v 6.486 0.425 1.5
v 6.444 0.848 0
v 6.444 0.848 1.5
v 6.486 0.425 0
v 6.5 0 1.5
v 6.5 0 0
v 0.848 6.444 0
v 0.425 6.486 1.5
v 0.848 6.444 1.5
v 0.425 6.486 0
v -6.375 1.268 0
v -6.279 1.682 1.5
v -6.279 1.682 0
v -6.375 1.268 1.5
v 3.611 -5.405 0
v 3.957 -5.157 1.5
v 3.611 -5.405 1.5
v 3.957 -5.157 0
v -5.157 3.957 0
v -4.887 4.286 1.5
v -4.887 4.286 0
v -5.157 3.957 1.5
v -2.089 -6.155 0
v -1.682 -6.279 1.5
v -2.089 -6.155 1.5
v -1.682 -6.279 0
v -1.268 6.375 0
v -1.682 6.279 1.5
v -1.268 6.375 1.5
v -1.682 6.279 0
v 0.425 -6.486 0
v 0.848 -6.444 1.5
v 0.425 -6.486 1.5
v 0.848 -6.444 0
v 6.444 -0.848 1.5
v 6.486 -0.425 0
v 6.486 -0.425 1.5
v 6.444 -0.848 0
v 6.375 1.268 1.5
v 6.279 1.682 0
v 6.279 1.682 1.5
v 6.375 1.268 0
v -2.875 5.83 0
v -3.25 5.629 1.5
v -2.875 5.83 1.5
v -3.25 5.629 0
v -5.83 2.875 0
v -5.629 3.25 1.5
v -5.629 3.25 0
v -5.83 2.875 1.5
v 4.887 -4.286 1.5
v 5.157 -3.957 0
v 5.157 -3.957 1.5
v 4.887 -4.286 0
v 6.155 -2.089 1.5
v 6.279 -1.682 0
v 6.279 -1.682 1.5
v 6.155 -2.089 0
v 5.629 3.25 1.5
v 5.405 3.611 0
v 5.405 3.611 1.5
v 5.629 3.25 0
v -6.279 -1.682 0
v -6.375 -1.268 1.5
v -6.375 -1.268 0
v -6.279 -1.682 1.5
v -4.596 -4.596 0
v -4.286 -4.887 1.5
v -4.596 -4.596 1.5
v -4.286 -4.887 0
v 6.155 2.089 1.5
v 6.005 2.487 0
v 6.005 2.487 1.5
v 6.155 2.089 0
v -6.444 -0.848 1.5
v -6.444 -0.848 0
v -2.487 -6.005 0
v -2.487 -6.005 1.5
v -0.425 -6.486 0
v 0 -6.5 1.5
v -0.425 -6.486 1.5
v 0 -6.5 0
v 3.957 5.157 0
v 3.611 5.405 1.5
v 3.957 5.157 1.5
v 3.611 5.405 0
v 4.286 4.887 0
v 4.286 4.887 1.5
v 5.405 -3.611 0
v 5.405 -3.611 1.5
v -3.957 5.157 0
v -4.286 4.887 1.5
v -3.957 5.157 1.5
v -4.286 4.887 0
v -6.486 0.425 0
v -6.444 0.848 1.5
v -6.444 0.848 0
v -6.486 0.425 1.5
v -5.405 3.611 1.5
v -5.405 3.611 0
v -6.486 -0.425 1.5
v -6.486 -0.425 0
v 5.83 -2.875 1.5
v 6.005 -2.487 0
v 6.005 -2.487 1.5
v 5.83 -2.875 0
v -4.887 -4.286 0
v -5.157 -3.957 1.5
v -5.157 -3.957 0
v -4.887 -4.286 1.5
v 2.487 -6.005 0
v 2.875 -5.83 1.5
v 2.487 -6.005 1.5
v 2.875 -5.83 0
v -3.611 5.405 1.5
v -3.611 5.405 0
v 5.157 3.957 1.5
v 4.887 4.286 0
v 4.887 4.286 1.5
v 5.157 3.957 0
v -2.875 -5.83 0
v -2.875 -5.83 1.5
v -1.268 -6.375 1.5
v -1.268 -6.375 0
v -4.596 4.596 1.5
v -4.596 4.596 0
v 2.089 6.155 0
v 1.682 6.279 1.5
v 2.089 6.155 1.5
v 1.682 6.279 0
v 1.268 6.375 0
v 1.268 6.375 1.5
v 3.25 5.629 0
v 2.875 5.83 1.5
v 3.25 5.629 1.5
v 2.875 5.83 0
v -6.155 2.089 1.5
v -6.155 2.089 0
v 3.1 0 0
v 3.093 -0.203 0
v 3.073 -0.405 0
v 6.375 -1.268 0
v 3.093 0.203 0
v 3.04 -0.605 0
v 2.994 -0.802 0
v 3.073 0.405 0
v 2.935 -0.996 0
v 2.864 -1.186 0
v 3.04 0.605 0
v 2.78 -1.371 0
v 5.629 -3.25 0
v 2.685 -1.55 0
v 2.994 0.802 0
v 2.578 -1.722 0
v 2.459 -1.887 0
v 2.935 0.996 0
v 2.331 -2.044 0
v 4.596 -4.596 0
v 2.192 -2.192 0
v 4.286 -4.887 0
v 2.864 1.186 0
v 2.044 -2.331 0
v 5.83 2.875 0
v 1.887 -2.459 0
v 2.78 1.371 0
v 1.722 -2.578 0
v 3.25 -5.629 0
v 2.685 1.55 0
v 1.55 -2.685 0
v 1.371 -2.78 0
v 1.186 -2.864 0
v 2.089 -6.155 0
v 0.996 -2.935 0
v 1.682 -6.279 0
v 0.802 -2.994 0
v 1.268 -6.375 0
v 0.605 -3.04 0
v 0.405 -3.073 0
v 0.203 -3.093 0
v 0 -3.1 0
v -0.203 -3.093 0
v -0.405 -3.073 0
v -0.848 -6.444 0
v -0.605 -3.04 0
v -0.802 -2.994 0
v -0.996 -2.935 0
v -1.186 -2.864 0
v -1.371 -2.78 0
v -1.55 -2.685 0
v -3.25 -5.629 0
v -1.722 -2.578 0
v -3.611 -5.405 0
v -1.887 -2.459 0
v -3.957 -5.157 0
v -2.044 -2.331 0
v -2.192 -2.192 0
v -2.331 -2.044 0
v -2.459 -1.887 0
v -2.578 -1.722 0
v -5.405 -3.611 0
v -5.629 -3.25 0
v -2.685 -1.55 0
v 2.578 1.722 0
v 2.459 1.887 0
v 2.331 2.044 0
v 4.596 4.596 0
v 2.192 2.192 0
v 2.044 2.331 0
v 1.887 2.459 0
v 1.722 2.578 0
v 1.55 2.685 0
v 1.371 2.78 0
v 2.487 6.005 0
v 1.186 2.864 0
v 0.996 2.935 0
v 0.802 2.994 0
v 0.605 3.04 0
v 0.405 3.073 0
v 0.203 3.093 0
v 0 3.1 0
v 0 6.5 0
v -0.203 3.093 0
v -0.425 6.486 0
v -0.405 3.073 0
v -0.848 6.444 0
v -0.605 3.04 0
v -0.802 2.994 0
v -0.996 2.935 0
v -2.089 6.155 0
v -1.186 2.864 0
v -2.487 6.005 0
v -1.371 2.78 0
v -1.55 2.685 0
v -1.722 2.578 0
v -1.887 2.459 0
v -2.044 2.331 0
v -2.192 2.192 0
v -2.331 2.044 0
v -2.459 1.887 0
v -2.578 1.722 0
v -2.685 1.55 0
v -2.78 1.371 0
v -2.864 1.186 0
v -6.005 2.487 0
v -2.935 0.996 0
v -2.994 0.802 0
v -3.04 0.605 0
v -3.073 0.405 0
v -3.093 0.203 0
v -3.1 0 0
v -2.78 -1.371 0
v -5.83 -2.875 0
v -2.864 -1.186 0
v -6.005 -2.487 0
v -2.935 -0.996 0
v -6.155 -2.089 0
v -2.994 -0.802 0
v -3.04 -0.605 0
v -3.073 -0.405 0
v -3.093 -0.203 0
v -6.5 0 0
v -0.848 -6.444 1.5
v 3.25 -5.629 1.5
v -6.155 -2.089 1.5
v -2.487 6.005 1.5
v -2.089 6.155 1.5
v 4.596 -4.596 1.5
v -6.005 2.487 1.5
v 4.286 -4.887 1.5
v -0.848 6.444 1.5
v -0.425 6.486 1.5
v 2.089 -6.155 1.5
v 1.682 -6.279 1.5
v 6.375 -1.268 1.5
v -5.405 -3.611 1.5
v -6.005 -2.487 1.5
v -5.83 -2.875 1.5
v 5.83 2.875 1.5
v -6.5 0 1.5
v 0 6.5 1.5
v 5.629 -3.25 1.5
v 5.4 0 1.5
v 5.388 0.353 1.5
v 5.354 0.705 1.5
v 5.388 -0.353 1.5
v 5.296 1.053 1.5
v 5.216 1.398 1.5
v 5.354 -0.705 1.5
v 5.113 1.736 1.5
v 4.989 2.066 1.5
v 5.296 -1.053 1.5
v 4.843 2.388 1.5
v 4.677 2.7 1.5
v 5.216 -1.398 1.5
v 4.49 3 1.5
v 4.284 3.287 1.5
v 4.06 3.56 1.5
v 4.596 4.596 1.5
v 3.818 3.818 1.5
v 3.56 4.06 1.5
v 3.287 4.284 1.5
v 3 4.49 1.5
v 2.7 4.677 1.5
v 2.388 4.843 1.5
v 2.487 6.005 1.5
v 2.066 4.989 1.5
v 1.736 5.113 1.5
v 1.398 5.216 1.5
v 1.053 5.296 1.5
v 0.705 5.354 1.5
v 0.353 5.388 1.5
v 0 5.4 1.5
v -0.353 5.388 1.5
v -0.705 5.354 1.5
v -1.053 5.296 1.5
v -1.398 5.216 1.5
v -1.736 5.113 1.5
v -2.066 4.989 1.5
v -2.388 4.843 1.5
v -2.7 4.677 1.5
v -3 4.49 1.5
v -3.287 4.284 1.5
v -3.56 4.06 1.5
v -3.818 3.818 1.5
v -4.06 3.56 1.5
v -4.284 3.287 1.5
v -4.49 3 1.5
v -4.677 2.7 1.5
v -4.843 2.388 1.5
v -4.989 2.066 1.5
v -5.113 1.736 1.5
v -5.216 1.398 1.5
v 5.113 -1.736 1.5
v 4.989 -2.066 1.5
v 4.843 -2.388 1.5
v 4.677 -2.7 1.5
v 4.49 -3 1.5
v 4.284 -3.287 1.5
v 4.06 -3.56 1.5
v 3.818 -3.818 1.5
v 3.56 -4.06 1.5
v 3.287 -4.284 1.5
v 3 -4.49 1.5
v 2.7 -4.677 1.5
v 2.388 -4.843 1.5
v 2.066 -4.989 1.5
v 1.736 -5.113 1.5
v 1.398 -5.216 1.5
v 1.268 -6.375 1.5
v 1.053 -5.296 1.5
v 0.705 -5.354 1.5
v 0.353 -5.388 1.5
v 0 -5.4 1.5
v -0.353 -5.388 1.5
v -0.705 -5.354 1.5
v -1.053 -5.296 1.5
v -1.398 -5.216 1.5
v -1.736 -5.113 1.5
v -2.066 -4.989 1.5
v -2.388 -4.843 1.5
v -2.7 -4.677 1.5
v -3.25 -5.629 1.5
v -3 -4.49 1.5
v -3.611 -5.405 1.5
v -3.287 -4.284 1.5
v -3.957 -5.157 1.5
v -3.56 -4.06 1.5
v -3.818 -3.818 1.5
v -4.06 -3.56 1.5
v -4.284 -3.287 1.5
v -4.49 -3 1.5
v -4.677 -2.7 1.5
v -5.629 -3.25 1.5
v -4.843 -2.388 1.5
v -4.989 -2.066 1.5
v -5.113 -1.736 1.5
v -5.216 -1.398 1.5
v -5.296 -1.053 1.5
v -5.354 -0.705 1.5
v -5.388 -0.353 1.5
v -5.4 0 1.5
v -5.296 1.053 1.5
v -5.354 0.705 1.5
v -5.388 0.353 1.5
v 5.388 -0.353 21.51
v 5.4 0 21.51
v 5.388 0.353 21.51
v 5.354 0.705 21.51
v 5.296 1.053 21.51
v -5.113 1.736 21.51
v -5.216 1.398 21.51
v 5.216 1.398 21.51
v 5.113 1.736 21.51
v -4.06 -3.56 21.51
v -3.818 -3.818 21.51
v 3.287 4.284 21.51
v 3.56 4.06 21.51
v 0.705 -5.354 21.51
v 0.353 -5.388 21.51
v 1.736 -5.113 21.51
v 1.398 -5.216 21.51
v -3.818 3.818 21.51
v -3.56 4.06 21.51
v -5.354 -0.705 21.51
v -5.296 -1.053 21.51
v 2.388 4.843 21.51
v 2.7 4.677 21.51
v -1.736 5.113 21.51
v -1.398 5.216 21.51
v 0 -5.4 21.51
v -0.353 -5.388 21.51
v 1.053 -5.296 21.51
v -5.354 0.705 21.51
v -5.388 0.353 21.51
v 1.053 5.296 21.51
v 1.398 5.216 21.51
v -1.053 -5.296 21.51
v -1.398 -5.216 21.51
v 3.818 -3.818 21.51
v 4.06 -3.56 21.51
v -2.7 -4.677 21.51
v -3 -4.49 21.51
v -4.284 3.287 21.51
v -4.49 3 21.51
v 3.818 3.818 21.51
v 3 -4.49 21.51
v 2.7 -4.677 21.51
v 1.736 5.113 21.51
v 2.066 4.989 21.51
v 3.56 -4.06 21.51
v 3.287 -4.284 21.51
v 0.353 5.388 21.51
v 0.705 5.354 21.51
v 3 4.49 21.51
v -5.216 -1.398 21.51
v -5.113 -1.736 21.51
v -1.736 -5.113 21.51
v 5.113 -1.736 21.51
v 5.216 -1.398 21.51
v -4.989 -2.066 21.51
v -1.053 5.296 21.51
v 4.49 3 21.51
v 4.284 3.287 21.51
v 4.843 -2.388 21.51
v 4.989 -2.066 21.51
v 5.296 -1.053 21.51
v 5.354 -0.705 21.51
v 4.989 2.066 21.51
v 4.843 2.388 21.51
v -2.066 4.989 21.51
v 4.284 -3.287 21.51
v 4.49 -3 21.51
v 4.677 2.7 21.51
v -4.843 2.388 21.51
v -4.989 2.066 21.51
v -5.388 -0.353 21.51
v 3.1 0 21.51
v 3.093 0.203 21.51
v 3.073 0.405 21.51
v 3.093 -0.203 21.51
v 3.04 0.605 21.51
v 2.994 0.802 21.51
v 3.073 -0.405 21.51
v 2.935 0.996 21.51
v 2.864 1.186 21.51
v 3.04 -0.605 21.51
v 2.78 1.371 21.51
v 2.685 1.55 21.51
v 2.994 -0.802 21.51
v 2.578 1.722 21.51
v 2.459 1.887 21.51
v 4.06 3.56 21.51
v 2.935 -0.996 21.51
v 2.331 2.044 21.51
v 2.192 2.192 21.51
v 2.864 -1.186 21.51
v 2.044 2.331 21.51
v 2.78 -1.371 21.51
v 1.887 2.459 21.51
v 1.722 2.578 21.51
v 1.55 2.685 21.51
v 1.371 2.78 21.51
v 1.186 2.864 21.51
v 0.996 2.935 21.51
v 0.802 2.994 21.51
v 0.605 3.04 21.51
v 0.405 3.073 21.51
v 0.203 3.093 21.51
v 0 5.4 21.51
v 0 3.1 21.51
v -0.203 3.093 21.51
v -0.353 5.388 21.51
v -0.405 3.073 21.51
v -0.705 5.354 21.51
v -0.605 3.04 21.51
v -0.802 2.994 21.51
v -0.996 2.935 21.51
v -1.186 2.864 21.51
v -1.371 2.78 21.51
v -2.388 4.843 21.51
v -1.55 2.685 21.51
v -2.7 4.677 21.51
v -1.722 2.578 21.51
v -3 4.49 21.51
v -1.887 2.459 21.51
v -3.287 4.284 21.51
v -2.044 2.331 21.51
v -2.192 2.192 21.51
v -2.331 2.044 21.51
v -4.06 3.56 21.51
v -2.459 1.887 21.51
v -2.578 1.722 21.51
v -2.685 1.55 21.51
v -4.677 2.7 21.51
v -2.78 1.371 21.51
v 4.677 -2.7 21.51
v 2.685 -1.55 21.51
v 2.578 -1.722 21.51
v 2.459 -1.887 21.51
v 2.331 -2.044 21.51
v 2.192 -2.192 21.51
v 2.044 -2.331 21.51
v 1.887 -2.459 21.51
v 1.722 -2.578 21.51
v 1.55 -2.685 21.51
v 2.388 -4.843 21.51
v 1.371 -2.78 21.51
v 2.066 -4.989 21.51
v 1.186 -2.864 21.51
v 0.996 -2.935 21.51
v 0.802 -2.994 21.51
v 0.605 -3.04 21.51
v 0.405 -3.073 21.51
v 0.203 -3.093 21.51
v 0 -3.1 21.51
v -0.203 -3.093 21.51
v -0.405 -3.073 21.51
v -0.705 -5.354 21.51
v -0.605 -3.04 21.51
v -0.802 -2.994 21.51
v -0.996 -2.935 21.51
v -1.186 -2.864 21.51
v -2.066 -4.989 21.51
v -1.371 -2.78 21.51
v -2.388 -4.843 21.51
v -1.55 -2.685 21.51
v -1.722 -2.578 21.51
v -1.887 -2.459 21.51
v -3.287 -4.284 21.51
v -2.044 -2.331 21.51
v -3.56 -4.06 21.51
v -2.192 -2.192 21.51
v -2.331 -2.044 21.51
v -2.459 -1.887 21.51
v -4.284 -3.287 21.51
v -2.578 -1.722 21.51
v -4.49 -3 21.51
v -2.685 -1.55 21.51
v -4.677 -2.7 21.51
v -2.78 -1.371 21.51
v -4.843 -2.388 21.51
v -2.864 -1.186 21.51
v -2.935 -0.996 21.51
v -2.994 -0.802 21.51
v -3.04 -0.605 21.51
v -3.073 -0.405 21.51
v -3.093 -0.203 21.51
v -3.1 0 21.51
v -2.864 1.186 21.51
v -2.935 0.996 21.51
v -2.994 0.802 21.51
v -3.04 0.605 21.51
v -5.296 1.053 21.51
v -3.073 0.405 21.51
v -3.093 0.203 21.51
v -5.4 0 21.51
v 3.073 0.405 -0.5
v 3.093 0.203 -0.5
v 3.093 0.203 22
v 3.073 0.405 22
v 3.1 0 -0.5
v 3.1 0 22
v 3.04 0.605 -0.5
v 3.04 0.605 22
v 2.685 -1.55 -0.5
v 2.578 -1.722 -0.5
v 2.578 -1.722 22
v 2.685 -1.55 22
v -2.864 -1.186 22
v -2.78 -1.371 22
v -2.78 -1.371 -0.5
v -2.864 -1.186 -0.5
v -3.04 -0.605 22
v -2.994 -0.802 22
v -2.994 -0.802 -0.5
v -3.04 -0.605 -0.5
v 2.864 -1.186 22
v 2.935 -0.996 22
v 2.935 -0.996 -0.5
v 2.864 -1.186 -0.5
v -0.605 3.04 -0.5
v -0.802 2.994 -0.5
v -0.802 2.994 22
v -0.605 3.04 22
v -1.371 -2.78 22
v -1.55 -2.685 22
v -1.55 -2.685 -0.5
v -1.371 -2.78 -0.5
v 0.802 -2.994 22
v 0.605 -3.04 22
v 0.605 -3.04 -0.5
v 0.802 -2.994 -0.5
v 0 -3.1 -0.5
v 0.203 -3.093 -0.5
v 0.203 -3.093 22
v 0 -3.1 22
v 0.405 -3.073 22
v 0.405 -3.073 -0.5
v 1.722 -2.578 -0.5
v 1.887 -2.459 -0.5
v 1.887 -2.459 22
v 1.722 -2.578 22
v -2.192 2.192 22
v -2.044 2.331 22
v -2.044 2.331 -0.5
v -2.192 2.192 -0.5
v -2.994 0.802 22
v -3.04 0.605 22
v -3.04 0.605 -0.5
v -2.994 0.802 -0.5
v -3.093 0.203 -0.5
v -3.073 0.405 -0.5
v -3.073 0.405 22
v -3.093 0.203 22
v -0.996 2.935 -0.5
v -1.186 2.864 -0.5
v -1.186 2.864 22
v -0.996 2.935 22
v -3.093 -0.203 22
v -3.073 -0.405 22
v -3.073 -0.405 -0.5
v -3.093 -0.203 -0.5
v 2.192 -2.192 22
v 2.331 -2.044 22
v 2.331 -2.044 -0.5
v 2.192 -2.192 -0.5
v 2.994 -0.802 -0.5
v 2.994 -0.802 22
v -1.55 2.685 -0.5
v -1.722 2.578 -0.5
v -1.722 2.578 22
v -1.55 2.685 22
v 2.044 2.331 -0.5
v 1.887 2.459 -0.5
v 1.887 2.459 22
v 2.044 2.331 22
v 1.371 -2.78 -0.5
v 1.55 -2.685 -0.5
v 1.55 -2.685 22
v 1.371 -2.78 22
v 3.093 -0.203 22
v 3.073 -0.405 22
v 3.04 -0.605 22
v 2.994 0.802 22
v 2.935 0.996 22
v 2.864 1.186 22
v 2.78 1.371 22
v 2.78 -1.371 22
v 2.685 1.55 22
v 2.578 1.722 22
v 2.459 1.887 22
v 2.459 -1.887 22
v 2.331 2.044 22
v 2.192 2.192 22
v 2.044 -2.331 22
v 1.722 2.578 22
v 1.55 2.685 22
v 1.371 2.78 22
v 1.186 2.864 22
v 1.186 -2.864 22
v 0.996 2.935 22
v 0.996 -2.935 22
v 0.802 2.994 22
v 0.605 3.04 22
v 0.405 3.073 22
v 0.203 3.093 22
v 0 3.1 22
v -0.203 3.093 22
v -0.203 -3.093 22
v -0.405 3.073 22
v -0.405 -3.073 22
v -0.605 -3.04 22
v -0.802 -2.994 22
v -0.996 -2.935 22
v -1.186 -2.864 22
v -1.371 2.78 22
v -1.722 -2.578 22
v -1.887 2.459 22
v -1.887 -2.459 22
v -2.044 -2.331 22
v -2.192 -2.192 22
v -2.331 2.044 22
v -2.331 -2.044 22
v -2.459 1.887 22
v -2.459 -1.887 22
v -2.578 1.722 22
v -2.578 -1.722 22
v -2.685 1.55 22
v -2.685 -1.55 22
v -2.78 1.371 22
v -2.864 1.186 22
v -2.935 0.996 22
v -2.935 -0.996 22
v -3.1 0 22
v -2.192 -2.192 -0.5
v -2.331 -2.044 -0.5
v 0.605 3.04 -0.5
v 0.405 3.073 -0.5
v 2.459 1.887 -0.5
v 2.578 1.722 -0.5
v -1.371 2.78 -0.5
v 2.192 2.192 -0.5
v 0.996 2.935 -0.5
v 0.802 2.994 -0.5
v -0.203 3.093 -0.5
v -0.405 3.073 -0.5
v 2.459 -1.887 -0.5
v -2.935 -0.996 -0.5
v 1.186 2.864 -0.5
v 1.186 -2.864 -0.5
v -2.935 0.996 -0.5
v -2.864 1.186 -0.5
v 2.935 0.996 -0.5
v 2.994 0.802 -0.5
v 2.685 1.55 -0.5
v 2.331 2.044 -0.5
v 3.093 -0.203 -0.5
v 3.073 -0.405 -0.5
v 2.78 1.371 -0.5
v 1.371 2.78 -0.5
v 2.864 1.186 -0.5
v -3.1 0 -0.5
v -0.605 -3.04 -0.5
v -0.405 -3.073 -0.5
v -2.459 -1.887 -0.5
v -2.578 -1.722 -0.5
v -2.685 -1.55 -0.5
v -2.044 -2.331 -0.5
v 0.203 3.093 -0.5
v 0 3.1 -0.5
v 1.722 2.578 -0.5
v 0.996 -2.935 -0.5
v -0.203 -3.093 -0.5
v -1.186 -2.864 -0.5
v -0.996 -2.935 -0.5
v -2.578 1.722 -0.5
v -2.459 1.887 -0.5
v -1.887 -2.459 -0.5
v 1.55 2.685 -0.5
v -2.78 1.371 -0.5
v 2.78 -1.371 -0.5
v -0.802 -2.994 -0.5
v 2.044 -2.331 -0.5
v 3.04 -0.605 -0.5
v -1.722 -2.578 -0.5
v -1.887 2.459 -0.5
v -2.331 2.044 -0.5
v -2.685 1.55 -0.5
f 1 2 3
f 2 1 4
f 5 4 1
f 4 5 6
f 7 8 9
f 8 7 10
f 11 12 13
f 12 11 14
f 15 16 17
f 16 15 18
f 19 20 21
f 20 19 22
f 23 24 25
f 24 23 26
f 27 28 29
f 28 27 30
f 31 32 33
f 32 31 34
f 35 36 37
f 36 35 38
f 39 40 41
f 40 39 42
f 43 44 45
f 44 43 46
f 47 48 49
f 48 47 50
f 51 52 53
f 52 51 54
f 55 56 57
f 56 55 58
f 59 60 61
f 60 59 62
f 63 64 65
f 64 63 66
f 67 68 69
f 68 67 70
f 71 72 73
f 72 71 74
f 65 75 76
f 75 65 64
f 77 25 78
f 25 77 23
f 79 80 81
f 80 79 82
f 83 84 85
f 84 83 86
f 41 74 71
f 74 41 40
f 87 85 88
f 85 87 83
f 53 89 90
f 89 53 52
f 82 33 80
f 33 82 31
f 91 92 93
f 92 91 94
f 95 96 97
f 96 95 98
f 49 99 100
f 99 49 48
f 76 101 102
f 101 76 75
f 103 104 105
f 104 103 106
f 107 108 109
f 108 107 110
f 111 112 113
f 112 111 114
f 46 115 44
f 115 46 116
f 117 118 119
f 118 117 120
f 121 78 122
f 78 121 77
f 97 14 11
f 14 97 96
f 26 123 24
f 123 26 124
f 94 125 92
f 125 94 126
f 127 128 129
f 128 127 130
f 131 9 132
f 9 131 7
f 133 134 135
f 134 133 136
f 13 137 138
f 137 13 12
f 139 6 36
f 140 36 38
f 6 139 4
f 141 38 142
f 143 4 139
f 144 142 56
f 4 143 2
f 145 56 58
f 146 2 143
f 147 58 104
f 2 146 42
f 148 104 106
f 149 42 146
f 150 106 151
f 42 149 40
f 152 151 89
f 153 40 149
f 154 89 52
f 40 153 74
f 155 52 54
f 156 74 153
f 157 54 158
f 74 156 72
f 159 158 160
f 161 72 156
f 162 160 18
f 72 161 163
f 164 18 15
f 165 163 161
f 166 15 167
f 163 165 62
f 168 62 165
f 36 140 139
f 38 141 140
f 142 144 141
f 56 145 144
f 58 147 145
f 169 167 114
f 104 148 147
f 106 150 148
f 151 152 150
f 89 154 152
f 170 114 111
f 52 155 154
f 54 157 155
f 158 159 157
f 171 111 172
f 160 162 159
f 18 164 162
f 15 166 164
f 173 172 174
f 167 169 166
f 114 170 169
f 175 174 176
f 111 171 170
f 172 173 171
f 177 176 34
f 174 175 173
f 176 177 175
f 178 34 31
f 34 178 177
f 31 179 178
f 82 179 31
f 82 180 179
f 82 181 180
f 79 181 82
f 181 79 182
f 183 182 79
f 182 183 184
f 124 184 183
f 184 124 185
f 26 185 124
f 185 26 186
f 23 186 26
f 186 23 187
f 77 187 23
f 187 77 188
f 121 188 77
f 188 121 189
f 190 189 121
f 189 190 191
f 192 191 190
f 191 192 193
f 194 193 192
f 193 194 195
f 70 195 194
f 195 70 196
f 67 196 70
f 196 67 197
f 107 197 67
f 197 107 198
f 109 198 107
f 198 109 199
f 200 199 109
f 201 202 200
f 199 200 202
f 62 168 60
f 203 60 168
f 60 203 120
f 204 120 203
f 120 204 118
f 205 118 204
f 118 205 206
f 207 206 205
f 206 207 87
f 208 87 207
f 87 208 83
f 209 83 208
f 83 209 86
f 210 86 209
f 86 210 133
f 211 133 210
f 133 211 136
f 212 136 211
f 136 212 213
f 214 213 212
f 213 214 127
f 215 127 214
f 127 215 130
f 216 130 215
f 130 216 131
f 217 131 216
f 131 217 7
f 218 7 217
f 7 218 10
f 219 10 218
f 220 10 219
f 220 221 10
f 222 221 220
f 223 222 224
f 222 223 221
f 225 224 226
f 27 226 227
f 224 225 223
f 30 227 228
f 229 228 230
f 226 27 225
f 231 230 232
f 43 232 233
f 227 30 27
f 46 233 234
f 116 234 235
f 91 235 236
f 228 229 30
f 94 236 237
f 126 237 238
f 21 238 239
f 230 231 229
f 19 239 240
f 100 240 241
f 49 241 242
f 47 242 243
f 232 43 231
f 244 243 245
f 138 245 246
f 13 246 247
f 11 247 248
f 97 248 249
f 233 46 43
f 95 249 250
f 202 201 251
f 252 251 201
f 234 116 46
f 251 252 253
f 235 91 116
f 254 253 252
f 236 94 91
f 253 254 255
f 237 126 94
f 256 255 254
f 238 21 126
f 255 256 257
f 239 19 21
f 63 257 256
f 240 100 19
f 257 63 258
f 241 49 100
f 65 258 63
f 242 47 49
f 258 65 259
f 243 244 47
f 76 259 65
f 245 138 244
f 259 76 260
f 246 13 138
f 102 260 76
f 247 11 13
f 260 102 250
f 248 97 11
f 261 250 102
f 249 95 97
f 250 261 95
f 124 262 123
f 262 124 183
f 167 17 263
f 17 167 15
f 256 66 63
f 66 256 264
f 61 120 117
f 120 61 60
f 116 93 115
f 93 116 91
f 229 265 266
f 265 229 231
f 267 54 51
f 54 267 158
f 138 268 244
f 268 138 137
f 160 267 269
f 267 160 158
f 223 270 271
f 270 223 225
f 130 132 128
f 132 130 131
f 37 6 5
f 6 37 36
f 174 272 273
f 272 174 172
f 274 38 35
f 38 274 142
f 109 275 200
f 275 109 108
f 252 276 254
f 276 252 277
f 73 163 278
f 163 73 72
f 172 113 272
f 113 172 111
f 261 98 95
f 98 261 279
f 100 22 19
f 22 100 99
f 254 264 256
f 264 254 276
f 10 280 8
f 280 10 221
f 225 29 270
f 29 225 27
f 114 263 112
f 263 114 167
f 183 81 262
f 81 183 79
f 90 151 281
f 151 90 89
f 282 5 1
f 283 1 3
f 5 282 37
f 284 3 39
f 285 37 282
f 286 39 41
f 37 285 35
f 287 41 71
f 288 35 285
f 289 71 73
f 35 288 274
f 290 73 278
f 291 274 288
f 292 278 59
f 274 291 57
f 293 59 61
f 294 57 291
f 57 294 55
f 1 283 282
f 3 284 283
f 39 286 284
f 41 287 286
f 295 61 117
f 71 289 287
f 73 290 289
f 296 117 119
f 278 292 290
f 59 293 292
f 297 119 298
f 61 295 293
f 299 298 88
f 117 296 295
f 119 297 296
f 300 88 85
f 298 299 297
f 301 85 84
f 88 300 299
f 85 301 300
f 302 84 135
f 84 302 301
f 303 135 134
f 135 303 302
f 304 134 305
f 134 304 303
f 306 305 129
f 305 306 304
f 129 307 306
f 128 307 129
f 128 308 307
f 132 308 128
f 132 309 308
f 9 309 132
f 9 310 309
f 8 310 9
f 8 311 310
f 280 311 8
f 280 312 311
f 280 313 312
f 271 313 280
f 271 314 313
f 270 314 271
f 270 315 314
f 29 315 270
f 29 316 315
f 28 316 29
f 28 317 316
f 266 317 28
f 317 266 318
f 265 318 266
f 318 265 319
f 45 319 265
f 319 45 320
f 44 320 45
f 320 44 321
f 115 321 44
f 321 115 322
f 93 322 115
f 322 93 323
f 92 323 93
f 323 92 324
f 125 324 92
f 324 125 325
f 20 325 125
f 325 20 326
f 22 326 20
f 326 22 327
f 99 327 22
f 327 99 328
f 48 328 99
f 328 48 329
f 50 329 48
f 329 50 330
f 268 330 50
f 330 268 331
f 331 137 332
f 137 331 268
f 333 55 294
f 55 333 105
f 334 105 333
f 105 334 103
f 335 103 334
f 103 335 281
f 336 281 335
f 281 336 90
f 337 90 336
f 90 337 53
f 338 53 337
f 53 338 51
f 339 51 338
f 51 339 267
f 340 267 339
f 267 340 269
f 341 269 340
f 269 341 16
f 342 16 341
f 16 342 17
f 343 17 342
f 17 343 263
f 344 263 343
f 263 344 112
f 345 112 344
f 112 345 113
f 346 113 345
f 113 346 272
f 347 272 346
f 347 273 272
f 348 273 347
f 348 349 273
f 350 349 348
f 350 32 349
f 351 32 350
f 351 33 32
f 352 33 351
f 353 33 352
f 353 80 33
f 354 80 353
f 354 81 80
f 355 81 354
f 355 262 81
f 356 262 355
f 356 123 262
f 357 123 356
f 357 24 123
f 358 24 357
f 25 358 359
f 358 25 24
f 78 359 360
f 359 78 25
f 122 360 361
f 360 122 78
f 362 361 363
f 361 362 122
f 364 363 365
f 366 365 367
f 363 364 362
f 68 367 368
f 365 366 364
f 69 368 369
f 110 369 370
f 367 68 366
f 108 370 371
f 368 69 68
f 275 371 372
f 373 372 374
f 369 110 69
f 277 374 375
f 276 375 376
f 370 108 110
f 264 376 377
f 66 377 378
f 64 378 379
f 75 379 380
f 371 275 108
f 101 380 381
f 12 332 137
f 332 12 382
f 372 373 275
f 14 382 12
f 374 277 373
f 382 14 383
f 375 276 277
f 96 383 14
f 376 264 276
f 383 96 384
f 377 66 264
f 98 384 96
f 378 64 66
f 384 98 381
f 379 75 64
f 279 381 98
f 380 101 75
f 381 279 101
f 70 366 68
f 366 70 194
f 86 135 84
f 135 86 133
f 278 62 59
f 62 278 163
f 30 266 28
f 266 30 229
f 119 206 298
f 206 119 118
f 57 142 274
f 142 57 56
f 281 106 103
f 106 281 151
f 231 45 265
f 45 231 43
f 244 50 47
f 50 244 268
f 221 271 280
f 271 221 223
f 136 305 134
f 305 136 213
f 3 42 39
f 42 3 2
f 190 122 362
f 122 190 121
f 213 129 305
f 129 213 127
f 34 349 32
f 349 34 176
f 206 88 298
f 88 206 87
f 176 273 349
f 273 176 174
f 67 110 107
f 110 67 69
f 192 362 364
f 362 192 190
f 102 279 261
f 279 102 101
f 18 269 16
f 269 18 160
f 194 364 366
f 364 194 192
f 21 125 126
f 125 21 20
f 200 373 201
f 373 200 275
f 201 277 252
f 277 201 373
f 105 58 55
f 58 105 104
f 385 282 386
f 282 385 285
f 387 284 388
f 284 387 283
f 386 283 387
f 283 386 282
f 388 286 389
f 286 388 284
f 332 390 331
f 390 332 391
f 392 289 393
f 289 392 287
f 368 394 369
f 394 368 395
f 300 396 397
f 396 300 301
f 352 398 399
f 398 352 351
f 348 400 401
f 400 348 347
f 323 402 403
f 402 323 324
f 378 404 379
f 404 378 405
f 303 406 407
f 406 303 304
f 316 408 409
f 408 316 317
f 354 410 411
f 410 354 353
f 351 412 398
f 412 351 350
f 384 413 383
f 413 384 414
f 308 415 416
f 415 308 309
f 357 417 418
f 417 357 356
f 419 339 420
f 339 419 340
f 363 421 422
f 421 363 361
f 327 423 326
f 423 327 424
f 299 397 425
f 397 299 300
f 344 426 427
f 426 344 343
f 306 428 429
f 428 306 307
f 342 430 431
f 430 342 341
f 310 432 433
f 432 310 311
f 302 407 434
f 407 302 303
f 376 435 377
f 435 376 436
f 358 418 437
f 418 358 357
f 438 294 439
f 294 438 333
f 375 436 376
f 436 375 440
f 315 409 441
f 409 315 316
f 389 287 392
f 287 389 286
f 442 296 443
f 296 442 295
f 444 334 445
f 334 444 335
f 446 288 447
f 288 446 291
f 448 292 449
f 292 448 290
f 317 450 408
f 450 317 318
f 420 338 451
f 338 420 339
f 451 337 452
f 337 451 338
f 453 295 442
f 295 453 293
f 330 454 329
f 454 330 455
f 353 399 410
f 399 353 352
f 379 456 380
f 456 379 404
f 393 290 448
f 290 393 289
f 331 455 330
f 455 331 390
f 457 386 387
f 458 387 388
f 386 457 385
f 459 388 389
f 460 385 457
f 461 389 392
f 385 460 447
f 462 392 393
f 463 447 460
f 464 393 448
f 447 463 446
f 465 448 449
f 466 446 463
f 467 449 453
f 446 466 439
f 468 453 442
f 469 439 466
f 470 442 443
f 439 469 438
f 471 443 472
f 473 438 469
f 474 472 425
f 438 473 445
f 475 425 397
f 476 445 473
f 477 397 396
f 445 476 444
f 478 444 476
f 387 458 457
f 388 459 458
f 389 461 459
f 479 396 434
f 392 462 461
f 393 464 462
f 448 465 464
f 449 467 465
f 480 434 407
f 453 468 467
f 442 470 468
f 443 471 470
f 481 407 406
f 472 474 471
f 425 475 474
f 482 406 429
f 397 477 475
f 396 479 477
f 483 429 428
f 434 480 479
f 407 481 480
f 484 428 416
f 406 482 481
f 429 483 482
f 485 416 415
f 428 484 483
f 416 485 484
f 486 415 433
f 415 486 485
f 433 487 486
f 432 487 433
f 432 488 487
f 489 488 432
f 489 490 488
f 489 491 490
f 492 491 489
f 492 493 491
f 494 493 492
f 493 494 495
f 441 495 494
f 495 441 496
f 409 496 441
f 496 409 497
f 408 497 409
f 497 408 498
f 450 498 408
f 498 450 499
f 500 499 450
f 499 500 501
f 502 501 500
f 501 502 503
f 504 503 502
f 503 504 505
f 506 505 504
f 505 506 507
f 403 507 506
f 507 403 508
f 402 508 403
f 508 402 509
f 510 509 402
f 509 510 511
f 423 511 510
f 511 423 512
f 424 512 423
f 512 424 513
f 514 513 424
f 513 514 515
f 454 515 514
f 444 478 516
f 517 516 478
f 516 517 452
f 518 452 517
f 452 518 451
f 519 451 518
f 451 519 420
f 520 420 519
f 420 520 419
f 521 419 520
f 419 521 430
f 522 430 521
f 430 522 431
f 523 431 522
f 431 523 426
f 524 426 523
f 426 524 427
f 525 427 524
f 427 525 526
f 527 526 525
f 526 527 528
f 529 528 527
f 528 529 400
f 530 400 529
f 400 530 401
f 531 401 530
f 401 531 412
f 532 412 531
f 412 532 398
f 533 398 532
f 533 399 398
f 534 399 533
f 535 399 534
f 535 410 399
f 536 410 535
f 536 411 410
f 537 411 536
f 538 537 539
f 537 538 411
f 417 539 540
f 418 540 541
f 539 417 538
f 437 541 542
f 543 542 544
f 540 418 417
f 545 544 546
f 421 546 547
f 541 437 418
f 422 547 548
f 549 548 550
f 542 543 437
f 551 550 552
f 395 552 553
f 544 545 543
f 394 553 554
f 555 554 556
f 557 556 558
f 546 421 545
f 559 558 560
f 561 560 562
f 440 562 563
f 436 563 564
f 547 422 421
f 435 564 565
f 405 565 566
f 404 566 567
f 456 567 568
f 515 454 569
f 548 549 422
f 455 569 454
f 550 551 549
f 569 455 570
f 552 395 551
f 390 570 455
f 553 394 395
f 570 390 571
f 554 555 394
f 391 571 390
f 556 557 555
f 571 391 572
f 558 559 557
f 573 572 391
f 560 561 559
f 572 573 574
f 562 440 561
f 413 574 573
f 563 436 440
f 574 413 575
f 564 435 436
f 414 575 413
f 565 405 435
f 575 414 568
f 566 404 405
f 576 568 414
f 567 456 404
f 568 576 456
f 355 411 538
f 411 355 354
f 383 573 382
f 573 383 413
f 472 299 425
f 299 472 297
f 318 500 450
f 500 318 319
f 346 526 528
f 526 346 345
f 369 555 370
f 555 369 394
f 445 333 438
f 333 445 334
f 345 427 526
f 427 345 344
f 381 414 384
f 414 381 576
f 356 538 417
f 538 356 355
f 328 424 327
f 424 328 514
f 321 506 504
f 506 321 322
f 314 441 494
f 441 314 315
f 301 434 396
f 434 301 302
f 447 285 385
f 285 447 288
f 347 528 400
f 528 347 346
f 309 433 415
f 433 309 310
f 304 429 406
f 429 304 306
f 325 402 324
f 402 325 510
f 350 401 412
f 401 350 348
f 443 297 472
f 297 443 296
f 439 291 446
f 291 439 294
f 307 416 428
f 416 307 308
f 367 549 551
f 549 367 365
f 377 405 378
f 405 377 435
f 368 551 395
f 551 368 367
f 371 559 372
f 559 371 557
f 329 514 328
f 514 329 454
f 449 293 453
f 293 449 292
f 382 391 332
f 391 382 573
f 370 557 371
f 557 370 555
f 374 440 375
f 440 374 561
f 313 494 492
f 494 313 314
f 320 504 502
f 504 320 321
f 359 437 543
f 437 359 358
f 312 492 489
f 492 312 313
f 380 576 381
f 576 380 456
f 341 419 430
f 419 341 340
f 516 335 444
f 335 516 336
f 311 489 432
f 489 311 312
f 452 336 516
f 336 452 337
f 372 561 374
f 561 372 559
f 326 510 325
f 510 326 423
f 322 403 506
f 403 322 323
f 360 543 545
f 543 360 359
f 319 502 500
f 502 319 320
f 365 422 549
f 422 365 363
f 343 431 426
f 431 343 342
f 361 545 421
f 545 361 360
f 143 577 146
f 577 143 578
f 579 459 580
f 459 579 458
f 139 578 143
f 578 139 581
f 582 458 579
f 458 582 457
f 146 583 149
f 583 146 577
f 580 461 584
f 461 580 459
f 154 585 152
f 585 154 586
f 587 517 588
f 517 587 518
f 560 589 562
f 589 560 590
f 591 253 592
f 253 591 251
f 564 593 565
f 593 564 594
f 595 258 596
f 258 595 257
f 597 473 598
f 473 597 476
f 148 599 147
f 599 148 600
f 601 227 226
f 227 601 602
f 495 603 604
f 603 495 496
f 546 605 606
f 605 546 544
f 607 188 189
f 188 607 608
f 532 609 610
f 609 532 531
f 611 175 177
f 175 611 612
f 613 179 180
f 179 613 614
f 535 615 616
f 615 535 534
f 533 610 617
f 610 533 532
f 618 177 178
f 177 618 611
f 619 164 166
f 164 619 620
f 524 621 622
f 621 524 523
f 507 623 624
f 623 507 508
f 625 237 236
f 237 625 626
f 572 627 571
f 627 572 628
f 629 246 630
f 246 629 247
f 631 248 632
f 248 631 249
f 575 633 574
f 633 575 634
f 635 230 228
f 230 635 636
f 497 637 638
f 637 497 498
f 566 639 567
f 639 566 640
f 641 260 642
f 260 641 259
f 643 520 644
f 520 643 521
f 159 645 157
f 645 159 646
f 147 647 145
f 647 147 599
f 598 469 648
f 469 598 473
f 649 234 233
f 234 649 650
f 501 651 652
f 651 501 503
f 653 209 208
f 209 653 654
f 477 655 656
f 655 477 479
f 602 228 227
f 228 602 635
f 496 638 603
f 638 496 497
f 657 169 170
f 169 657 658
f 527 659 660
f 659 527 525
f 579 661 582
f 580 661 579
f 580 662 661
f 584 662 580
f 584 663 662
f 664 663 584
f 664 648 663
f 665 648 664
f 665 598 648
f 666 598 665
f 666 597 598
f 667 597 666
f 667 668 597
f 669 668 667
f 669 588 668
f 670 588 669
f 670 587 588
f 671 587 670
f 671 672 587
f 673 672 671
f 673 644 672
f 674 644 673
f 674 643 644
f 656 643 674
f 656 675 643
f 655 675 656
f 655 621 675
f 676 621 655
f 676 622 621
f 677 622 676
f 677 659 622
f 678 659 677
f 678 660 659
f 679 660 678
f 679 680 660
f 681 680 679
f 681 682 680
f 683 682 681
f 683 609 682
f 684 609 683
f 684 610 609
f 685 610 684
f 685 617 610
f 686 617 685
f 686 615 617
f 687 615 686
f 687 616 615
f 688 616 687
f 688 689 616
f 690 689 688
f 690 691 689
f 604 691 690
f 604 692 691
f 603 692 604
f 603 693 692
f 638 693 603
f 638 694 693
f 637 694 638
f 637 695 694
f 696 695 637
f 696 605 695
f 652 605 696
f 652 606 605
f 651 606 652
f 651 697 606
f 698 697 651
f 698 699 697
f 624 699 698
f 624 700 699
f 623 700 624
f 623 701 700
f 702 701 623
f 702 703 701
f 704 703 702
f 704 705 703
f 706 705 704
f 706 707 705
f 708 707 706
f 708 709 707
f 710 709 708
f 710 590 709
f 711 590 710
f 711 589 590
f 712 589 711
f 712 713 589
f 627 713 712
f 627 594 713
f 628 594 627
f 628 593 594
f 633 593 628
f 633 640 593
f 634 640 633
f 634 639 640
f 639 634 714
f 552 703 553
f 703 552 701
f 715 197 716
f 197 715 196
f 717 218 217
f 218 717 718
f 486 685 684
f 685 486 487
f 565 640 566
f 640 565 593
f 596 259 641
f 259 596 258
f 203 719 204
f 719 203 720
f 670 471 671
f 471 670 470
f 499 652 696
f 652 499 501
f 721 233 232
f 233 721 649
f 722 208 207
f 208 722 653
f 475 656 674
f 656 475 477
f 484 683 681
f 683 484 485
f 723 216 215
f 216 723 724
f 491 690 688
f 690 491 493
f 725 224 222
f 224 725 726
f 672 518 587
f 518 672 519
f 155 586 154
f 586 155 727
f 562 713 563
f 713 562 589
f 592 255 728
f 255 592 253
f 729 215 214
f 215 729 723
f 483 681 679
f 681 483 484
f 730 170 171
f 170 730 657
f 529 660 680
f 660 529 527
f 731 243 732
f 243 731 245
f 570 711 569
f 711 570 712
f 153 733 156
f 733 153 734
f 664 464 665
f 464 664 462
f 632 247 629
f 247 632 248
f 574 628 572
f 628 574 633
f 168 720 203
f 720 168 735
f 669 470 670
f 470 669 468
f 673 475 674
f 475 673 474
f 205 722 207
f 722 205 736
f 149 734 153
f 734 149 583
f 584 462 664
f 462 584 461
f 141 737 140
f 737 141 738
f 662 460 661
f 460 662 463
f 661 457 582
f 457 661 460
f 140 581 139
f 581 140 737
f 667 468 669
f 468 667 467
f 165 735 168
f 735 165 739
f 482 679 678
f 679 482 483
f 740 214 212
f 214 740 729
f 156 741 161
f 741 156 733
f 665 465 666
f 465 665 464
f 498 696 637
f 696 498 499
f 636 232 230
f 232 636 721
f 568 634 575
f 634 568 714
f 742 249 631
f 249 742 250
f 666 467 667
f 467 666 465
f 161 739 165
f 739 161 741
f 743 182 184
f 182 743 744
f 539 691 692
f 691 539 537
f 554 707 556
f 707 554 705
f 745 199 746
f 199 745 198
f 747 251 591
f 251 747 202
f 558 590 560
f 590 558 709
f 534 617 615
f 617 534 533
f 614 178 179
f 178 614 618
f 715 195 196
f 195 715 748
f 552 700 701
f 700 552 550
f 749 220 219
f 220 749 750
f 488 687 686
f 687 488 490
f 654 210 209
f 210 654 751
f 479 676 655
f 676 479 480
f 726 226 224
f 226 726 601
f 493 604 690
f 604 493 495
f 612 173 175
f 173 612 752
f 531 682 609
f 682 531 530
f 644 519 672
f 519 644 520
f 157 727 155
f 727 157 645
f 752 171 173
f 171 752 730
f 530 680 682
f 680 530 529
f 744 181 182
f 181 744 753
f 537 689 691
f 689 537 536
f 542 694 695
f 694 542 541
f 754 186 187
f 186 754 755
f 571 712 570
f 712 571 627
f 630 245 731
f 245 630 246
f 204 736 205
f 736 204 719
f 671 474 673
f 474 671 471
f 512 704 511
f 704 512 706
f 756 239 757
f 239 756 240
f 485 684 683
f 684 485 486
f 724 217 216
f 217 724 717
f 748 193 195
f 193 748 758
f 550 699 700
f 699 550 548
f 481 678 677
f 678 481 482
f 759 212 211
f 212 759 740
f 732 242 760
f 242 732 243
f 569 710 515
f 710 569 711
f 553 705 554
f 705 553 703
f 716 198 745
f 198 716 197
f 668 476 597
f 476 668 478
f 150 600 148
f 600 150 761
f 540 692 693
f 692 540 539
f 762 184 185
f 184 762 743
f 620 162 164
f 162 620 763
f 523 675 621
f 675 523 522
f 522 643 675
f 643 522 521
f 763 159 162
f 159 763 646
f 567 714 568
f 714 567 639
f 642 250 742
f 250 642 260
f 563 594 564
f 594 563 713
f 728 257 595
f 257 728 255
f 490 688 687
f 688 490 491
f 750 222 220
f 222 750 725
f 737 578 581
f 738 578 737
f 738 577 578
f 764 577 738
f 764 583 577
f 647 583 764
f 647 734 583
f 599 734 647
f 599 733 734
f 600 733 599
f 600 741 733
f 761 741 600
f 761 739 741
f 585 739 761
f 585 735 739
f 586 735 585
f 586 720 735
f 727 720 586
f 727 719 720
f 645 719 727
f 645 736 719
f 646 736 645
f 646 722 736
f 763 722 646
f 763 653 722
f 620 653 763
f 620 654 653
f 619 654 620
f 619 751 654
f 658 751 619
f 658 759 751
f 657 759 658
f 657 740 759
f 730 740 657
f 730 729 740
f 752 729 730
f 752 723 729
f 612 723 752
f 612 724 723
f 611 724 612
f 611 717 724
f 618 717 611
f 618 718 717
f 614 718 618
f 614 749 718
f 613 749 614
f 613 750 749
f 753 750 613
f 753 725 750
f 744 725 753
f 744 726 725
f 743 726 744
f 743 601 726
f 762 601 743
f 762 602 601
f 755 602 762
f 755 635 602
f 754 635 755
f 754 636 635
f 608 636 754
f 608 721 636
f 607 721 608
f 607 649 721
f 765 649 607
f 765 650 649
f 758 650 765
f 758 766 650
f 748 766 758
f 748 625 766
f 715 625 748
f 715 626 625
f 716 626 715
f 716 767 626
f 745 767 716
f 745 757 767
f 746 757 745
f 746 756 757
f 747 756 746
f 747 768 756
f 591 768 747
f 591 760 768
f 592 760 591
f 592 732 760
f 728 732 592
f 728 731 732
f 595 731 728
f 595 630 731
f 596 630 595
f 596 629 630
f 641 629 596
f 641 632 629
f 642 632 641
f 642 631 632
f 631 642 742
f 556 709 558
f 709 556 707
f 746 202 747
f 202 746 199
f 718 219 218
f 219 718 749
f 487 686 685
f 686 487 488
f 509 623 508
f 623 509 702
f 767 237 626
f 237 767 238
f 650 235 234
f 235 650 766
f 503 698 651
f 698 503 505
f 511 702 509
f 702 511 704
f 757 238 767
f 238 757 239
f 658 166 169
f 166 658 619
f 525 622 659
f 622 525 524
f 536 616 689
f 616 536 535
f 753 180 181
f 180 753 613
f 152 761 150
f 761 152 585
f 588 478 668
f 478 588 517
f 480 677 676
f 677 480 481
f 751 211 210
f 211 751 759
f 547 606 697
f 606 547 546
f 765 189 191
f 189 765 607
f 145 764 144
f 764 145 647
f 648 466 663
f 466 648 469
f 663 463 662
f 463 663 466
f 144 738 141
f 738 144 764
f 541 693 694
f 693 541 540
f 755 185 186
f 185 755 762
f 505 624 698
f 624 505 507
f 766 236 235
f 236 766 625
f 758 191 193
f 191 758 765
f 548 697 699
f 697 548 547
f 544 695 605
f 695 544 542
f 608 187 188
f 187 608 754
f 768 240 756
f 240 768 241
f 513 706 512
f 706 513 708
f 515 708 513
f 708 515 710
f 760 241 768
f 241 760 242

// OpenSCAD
// Adapter sleeve: 0.2 mL PCR tube for 1.5 mL tube rack hole
// Print orientation: collar on bed (z = 0), sleeve body builds upward

// ---- Dimensions (mm) ----
collar_d        = 13;     // collar outer diameter
collar_t        = 1.5;    // collar thickness (z = 0 to 1.5)
sleeve_d        = 10.8;   // sleeve body outer diameter
sleeve_h        = 20;     // sleeve body height (z = 1.5 to 21.5)
bore_d          = 6.2;    // through-bore diameter
eps             = 0.5;    // cutter overshoot past faces

$fn = 96;

// ---- Model ----
union() {
    // Collar
    cylinder(d = collar_d, h = collar_t);
    // Sleeve body (slightly overlapping the collar for a clean union)
    translate([0, 0, collar_t - 0.01])
        cylinder(d = sleeve_d, h = sleeve_h + 0.02);
    // Through bore
    translate([0, 0, -eps])
        cylinder(d = bore_d, h = sleeve_h + collar_t + 2 * eps);
}
